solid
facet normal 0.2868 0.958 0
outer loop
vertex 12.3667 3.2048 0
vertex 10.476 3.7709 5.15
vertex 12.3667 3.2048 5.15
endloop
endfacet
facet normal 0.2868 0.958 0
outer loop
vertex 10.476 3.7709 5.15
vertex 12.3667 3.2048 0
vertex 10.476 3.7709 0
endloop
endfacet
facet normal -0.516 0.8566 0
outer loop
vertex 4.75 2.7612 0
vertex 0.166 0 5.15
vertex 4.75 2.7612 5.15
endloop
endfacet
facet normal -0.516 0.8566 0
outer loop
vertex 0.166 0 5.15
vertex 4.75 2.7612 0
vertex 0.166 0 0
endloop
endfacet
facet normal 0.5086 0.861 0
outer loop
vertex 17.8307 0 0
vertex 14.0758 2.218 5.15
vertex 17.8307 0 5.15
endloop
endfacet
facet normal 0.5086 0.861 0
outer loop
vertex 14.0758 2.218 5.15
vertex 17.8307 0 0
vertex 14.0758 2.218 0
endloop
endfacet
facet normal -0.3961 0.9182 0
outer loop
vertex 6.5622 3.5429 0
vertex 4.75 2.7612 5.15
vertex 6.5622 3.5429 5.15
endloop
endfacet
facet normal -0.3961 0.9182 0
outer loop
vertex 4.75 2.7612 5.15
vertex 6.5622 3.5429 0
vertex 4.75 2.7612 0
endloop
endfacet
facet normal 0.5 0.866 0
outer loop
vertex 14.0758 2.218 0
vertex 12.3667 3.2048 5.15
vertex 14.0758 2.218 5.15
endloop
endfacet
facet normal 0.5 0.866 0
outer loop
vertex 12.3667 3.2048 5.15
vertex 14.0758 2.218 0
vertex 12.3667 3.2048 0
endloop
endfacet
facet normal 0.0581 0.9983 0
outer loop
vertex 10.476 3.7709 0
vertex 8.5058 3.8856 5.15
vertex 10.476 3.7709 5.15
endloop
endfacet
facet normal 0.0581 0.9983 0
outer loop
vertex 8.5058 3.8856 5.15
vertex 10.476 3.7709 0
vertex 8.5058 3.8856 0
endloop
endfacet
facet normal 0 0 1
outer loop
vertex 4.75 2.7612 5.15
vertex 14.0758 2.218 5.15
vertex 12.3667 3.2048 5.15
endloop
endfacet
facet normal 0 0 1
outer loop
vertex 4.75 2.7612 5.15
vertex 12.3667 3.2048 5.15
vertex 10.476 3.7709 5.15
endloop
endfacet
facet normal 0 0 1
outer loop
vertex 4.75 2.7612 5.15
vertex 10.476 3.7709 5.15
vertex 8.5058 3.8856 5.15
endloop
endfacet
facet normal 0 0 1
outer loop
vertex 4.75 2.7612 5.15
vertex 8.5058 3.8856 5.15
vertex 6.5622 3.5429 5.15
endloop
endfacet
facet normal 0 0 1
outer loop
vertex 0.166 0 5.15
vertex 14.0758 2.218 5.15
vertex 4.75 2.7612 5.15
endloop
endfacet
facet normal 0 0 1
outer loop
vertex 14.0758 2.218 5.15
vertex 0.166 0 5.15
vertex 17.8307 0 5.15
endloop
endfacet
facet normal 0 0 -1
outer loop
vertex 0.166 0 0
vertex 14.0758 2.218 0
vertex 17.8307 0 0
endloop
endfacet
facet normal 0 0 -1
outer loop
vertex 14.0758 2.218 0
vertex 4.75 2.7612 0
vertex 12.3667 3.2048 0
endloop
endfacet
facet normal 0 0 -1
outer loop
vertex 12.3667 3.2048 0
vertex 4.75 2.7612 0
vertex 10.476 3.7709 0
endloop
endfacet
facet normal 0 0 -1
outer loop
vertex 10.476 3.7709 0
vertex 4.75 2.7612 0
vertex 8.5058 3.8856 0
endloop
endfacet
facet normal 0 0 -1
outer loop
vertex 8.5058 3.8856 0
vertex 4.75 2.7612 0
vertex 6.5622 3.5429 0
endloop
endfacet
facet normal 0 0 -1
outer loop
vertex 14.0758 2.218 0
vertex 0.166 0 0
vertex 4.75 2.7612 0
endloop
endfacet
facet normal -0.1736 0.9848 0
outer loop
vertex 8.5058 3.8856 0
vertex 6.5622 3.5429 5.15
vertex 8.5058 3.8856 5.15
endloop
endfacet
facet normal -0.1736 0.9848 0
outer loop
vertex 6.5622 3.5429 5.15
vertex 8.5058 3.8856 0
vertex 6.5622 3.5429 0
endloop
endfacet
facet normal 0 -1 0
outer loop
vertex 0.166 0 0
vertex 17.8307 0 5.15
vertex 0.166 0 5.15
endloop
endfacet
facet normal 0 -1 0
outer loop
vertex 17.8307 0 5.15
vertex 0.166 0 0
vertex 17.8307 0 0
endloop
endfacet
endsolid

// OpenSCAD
//include <diabolobox.scad>;

module rpi_sd_card_slot(h=5.15, depth=6) {
  dia = 17;
  front = 18;
  cut = dia - depth;
    translate([0, -cut -0.1])
    difference() {
      hull() {
	  cube([front, cut, h]);
	  translate([front/2, dia/2])
	    cylinder(h=h, d=dia);
        }
      translate([-front/2, -0.1, -0.1])
	cube([2*front, cut + 0.2, h+0.2]);
    }
};

module bottom_sd_card(off, od, ow) {
  translate([ow/2 - 9, od + 0.01, -0.1])
    mirror([0,1,0])
    rpi_sd_card_slot(depth=off + 3);
}

module sd_card_guard(off, od, ow, th) {
  translate([ow/2 - 9, od - off - 3, th]) cube([18, 3, 1.4]);
}

module panel_sd_card(off, ow, dh, h) {
  rotate([-90, 0, 0])
    translate([dh - off + ow/2 - 9, -off, -0.01]) 
    rpi_sd_card_slot(h=h, depth=off + 3);
}

rpi_sd_card_slot(depth=4);
